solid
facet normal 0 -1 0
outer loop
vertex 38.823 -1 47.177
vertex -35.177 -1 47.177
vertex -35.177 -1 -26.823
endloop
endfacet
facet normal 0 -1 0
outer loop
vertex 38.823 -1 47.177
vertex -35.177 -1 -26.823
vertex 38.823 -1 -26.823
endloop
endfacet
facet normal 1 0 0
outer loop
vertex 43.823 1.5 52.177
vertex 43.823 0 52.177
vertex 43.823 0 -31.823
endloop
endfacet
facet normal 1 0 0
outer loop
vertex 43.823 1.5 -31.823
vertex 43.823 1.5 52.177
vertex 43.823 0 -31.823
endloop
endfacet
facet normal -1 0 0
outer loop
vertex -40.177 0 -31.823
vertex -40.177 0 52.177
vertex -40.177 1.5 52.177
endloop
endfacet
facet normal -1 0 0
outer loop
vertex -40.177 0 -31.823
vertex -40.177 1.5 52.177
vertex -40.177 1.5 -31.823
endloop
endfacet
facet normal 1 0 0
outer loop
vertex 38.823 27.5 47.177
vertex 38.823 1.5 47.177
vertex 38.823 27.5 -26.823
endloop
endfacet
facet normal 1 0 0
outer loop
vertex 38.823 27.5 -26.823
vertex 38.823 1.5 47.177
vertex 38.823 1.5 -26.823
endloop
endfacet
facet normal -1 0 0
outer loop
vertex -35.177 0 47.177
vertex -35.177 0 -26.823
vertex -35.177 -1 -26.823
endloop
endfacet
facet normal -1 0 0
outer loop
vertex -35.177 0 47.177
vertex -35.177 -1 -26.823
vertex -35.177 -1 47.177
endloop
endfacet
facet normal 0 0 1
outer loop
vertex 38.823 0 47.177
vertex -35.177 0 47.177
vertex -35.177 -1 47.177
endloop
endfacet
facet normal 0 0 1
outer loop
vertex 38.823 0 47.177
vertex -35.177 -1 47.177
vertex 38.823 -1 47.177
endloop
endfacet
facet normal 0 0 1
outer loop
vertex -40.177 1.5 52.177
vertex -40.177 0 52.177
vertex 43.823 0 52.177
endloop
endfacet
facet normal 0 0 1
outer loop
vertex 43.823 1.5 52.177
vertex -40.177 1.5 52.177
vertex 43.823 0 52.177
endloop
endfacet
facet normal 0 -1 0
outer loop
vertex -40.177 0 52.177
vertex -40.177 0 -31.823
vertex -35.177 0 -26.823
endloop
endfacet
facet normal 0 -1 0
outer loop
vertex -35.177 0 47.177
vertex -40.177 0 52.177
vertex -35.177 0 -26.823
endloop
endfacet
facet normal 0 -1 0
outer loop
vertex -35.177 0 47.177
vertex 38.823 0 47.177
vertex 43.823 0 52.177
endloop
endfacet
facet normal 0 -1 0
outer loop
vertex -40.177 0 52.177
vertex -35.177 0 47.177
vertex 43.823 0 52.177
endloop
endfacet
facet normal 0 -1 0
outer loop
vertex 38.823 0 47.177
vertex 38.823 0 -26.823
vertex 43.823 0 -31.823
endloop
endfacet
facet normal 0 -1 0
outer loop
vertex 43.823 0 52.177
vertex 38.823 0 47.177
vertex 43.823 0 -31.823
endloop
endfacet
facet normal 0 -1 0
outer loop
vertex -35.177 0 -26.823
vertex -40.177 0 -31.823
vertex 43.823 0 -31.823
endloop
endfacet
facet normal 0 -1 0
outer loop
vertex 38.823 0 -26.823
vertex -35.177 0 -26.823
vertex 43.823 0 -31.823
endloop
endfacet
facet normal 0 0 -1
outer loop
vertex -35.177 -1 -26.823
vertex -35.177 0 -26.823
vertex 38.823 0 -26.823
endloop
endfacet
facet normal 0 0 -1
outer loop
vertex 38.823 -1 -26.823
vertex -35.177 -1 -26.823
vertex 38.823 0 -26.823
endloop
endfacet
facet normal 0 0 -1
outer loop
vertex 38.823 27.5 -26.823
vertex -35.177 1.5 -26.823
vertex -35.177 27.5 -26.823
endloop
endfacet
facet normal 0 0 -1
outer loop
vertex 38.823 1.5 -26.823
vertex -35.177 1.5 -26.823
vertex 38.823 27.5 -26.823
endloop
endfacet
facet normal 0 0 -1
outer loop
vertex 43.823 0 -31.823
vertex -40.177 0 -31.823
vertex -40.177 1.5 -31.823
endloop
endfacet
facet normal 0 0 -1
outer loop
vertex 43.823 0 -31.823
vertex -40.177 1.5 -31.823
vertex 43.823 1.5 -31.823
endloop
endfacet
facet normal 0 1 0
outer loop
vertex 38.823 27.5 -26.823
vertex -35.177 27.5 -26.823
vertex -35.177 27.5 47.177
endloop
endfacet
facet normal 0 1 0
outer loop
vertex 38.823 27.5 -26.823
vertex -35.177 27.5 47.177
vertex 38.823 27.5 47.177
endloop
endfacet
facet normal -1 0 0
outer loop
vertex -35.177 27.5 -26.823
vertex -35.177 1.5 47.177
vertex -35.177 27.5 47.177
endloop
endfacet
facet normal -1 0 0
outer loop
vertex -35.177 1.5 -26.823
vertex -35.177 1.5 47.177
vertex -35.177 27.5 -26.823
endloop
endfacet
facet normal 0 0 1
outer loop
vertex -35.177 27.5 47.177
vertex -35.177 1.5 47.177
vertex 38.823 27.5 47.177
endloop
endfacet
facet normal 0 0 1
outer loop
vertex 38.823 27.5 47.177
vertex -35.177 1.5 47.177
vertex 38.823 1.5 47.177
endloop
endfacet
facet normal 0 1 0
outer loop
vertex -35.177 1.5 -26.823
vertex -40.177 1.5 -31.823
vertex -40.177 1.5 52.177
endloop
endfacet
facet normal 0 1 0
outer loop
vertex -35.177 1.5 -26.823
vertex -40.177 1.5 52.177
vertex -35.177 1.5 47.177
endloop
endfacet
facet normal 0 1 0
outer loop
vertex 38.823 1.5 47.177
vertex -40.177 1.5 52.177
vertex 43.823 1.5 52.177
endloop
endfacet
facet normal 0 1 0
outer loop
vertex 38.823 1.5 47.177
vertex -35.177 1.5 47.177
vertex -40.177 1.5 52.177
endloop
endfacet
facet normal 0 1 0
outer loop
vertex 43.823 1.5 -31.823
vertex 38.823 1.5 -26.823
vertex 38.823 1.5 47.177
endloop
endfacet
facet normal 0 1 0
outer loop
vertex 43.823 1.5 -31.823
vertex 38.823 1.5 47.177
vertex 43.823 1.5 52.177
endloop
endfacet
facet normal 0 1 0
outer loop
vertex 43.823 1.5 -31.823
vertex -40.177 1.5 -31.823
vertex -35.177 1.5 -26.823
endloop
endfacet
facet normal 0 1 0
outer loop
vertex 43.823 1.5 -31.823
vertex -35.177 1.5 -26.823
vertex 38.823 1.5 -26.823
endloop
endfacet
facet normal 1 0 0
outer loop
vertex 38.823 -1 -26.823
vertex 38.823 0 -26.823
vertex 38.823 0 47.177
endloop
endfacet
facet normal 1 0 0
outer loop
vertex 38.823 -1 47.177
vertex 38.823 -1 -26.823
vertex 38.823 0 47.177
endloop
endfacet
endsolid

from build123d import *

# Parameters (mm, degrees)
SKETCH_1_W      = 84
SKETCH_1_H      = 84
EXTRUDE_1_DEPTH = 1.5
SKETCH_2_W      = 74
SKETCH_2_H      = 74
EXTRUDE_2_DEPTH = 26
SKETCH_3_W      = 74
SKETCH_3_H      = 74
EXTRUDE_3_DEPTH = 1


with BuildPart() as part:
    # 草图1 → 凸台-拉伸1 (new body)
    with BuildSketch(Plane(origin=(0, 0, 0), x_dir=(1, 0, 0), z_dir=(0, 1, 0))):
        with Locations((1.82278481, -10.17721519)):
            Rectangle(SKETCH_1_W, SKETCH_1_H)
    extrude(amount=EXTRUDE_1_DEPTH)

    # 草图2 → 凸台-拉伸2 (add)
    with BuildSketch(Plane(origin=(0, 1.5, 0), x_dir=(1, 0, 0), z_dir=(0, 1, 0))):
        with Locations((1.82278481, -10.17721519)):
            Rectangle(SKETCH_2_W, SKETCH_2_H)
    extrude(amount=EXTRUDE_2_DEPTH)

    # 草图3 → 凸台-拉伸3 (add)
    with BuildSketch(Plane.XZ):
        with Locations((1.82278481, 10.17721519)):
            Rectangle(SKETCH_3_W, SKETCH_3_H)
    extrude(amount=EXTRUDE_3_DEPTH)


solid = part.part
